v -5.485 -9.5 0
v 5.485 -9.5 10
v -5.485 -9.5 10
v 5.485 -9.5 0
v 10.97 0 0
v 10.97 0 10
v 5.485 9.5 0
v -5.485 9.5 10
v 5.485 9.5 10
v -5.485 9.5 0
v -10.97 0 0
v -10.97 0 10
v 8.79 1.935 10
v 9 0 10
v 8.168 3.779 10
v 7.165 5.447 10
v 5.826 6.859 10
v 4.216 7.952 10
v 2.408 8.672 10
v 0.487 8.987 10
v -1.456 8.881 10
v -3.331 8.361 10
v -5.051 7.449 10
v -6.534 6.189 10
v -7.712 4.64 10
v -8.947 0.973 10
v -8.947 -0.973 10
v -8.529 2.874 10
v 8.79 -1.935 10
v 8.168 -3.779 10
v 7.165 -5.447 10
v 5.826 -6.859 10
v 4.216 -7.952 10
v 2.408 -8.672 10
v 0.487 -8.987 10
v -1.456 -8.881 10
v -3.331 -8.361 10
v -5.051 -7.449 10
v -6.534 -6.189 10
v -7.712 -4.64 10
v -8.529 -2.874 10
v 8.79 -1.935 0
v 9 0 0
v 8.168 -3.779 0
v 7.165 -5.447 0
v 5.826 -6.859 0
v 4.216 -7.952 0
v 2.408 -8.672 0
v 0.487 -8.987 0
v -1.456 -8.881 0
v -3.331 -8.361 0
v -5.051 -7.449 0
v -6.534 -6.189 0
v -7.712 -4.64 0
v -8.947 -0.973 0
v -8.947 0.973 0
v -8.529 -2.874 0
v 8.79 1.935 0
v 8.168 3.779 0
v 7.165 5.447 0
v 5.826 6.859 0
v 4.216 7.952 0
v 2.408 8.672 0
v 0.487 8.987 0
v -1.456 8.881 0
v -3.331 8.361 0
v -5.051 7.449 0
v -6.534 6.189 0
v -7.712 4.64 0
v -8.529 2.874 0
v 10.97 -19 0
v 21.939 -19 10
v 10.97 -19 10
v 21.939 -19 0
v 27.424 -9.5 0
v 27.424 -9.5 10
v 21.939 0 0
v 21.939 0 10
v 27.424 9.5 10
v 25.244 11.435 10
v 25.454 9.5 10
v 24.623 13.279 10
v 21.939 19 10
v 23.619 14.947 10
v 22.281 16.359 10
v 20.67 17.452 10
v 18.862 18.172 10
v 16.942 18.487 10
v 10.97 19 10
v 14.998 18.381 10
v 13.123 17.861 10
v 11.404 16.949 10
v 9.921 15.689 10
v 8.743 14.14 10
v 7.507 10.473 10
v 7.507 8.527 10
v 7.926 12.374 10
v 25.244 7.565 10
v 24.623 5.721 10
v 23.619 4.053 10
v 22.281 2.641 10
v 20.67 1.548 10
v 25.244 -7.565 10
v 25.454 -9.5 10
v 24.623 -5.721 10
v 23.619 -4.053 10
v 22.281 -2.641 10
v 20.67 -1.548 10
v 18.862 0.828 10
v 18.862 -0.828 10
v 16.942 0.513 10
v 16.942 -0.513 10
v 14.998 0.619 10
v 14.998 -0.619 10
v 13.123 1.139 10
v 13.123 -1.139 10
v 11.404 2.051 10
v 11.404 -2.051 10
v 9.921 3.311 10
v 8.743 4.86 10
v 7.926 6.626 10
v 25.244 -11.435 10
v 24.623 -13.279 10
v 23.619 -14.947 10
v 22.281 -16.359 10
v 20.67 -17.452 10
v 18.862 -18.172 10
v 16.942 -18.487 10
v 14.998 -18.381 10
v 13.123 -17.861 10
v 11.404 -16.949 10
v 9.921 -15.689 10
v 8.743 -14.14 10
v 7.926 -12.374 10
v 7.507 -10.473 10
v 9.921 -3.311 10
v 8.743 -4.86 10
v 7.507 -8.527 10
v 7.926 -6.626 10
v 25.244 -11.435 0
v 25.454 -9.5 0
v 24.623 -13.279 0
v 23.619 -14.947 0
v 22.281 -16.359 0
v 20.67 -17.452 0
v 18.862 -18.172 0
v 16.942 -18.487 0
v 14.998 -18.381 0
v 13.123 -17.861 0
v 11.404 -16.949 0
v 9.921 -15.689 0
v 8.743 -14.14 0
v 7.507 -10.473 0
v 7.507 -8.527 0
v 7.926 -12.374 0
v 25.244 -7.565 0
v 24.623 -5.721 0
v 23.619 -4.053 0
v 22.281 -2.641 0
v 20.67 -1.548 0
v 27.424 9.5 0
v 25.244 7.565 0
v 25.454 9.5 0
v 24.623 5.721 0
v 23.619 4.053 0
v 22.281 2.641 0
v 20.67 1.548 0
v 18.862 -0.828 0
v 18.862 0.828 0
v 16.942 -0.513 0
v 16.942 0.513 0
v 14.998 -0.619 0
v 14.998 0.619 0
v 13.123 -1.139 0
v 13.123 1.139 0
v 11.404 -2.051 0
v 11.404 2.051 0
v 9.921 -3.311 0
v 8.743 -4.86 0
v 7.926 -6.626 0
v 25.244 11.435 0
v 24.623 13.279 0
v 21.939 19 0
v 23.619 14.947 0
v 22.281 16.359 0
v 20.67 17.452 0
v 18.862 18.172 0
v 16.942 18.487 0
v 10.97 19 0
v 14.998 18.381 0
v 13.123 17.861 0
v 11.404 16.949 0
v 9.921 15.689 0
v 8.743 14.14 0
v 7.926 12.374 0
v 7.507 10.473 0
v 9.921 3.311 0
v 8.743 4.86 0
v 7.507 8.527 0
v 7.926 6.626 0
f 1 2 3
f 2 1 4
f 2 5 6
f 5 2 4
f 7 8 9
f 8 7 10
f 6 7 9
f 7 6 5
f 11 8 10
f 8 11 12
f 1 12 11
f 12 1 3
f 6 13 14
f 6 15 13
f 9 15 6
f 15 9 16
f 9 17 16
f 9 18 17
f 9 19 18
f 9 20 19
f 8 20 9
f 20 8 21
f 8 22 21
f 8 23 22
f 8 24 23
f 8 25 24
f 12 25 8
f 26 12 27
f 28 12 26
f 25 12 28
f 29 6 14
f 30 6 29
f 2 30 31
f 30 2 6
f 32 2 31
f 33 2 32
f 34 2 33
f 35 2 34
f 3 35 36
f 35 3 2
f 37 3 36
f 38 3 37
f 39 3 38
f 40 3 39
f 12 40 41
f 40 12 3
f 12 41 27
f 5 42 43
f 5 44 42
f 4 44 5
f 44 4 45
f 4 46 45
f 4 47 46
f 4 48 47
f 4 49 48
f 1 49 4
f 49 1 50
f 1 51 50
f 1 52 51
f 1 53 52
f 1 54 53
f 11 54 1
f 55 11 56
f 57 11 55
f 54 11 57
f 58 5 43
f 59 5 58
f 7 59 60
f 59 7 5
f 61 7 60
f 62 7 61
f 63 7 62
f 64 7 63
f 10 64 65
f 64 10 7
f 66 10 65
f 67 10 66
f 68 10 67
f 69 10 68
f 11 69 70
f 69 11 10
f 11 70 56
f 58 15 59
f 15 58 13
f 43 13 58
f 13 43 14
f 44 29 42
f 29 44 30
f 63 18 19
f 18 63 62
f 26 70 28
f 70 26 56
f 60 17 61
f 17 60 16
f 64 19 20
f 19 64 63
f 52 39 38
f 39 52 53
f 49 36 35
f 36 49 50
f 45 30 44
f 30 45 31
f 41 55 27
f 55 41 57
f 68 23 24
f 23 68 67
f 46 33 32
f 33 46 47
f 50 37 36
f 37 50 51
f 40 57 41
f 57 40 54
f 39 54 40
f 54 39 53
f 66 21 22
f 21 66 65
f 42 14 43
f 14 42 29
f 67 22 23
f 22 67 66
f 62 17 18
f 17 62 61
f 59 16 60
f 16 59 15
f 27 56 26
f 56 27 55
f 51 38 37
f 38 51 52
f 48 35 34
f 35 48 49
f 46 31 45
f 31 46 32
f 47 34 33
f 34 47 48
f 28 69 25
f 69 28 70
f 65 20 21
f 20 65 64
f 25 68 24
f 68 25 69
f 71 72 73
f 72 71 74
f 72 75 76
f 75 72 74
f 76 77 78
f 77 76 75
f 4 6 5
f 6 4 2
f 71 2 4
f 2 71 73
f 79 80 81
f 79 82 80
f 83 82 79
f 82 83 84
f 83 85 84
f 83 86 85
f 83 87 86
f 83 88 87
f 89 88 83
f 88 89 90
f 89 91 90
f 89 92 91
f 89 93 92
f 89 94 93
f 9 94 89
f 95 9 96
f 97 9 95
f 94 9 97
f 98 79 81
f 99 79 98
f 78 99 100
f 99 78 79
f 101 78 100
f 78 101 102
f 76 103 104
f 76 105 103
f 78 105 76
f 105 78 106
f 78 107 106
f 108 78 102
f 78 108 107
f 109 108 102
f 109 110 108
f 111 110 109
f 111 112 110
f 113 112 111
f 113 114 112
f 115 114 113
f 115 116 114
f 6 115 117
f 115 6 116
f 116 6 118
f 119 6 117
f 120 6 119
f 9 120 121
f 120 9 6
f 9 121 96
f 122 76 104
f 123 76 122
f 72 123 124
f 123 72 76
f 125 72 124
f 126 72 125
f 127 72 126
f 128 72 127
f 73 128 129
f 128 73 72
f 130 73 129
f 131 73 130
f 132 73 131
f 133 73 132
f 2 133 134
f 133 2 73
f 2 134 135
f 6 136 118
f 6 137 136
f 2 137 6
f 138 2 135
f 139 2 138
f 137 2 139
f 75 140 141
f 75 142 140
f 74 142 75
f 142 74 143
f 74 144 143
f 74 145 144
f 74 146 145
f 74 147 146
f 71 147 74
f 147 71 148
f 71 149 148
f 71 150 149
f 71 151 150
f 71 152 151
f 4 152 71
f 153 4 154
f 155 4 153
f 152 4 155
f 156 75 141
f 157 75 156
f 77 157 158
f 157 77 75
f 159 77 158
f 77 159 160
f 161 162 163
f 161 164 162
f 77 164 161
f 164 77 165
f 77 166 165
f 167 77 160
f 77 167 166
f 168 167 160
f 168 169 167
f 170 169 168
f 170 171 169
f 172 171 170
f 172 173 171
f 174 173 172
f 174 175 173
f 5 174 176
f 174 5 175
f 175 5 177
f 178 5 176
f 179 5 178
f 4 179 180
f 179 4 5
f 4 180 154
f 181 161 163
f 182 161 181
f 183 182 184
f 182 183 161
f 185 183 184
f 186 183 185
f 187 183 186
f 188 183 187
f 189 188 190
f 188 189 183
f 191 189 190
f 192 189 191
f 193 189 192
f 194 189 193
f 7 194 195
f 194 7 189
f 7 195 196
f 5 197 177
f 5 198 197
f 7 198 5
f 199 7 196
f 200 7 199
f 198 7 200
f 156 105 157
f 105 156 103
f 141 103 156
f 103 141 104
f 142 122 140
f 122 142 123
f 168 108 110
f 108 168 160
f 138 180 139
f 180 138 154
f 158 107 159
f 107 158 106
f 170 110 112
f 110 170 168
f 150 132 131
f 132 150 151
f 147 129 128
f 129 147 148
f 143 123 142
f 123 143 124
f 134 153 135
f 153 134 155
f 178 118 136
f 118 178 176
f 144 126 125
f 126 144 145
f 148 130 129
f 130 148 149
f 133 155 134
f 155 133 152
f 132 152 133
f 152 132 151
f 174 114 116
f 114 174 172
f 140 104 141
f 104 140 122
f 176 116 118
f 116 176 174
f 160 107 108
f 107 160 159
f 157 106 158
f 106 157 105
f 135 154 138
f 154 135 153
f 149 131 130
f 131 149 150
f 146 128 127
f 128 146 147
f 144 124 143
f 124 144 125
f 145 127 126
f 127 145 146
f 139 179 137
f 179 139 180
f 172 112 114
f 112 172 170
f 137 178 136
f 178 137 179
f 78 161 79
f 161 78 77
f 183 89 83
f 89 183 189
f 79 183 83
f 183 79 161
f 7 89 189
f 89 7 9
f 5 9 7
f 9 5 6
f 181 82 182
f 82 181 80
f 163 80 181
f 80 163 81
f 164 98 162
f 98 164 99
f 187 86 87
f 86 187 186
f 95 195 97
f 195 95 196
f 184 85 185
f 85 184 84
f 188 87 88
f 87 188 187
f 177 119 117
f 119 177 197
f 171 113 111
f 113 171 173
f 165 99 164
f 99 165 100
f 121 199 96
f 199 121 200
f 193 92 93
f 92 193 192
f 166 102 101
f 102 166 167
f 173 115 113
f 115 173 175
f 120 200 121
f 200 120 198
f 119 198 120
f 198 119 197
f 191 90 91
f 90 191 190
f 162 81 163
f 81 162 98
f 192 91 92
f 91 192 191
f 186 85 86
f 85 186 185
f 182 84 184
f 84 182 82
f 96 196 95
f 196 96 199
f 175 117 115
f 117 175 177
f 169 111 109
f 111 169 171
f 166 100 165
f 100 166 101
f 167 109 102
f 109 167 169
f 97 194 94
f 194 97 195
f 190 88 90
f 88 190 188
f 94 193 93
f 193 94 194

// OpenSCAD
cell_d = 18;
height = 10;
wall = 1;
tolerance = 0.1;

$fs = 2;
root3 = sqrt(3);
hex_d = cell_d + wall;

module tab(tall, tolerance = 0) {
	/* circular? * /
	rotate(-4, [0,0,1])
		translate([(hex_d/root3*2)/2.15, 0, 0])
			#cylinder(d = wall+tolerance, h=tall, $fn=10);
	/**/

	/* triangular? */

	/**/

	// follow contours?

	// spiral?
}

module single() {
	difference() {
		cylinder(d=hex_d/root3*2, h=height, $fn=6);

		translate([0, 0, -1])
			cylinder(d=cell_d, h=height+2);

		translate([0, 0, -1])
			tab(height+2);
	}
}

single();
translate([hex_d*root3/2, -hex_d/2, 0])
	color("red") single();
translate([hex_d*root3/2, hex_d/2, 0])
	color("blue") single();
